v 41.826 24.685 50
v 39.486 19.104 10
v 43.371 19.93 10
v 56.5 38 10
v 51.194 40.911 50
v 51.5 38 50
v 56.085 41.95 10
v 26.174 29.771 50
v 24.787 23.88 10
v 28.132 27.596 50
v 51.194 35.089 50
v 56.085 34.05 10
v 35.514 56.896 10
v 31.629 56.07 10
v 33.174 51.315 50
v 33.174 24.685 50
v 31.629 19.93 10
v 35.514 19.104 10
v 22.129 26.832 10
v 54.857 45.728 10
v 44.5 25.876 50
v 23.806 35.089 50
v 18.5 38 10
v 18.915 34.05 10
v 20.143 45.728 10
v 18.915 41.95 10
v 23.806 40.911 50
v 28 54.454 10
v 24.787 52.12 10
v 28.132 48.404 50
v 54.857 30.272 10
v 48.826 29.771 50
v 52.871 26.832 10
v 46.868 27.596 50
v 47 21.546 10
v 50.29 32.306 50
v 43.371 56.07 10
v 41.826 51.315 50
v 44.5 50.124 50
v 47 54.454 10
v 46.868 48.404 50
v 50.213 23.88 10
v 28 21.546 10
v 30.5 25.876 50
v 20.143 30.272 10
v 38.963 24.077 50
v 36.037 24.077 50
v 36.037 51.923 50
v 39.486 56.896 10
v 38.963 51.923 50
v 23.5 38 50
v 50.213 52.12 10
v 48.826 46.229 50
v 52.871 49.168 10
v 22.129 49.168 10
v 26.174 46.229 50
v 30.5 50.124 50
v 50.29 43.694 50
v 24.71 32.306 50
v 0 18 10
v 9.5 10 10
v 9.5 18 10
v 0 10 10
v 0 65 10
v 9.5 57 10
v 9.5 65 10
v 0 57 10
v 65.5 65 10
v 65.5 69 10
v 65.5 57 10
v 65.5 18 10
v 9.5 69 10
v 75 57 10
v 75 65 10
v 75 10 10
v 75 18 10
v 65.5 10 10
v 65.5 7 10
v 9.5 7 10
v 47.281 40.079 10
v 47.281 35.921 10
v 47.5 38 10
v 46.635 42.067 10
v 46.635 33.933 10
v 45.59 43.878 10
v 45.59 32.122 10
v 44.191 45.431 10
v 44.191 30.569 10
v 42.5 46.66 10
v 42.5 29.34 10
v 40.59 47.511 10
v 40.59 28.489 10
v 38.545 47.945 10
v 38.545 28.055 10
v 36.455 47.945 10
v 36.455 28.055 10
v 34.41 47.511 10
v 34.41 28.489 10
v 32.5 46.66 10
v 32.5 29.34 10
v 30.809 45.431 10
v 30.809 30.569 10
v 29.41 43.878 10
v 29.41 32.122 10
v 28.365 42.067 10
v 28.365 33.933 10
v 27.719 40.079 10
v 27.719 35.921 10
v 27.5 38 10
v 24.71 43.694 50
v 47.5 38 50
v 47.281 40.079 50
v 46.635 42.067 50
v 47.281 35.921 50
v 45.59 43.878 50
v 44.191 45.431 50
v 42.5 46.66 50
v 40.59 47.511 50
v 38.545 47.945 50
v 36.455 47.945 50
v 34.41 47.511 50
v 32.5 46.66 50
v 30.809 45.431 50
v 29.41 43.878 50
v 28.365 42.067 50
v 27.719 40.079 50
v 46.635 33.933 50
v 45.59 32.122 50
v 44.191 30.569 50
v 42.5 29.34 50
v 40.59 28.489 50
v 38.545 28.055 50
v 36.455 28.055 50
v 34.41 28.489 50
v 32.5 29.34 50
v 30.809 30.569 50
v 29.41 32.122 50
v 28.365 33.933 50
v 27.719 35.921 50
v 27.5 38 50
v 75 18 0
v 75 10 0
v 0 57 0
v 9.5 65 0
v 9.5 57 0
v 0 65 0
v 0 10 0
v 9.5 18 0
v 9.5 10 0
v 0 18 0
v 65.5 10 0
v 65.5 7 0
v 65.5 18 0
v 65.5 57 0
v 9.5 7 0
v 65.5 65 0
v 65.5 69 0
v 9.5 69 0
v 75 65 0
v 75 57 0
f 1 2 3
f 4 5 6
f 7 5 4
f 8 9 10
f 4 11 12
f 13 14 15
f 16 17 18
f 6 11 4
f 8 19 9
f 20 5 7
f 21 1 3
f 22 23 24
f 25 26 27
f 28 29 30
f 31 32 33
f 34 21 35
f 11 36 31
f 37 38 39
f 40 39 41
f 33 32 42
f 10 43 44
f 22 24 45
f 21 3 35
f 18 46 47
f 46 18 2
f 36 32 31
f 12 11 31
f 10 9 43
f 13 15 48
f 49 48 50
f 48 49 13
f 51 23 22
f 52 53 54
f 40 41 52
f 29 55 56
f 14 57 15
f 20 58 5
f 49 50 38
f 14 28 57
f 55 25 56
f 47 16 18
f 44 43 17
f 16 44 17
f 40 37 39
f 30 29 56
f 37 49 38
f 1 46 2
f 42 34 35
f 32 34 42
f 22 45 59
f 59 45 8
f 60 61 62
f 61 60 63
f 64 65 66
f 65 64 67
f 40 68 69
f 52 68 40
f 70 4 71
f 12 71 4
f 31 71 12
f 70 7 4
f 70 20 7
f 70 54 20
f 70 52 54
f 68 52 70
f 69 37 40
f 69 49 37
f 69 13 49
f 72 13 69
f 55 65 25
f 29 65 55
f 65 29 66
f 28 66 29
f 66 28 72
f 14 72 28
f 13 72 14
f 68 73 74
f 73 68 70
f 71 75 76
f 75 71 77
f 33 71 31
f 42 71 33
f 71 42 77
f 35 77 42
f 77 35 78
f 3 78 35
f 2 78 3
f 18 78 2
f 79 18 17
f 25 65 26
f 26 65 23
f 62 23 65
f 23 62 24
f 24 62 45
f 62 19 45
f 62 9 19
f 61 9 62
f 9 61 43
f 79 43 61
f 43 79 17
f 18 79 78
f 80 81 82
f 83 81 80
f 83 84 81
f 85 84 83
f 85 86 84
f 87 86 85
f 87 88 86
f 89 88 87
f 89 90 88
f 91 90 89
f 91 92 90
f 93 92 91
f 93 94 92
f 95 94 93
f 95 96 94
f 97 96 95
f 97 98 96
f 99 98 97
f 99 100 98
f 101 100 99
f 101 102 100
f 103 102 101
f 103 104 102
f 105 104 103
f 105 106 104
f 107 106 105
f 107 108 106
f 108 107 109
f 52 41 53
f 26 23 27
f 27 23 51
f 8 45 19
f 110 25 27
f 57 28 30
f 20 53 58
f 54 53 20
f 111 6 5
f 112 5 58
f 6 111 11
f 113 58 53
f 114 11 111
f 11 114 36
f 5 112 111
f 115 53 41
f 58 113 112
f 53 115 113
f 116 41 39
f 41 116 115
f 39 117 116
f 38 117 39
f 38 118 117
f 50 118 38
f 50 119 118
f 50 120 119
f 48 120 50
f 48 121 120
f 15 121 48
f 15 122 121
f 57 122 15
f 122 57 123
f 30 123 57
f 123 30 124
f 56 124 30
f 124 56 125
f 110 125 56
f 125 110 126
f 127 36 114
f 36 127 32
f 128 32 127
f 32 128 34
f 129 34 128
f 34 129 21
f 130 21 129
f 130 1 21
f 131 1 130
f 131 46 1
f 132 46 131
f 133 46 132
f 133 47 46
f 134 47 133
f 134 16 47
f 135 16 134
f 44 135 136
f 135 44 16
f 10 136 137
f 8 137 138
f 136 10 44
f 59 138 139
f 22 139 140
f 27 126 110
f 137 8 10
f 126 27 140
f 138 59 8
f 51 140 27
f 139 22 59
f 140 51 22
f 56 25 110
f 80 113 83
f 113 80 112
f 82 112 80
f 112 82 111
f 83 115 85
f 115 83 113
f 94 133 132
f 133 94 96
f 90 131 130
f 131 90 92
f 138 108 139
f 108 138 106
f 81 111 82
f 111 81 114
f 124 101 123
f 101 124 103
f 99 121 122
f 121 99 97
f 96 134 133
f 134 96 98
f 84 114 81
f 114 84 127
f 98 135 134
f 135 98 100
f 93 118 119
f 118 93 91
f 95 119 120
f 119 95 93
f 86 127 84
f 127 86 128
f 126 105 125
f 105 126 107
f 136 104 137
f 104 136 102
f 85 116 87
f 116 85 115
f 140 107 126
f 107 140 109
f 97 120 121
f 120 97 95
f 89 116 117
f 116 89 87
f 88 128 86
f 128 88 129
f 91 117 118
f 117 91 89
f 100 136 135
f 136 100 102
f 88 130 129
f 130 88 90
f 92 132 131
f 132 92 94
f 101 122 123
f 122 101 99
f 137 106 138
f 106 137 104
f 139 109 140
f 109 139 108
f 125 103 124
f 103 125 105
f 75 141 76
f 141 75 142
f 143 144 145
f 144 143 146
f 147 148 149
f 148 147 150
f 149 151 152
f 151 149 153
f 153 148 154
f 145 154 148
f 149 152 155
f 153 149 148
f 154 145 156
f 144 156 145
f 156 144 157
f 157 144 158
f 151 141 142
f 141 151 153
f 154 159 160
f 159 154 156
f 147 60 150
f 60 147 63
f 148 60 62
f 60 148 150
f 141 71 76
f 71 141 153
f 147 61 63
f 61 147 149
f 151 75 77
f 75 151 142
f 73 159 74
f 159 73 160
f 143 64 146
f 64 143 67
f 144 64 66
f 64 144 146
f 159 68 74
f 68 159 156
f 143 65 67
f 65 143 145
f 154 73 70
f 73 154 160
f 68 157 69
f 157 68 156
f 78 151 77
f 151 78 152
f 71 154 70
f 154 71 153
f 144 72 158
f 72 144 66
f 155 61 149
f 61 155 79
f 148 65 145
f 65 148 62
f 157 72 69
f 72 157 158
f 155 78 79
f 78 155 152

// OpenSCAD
height = 40;
radius = 10;
rad_ext = radius+4;

union(){
	translate([0, 8+2, 0]) cube([75,8,10]);
	translate([0, 62-5, 0]) cube([75,8,10]);
	translate([(75-56)/2, 7, 0]) cube([56,62,10]);
	difference(){
		translate([75/2, 62/2+7, 10]) cylinder(height,rad_ext+5,rad_ext);
		translate([75/2, 62/2+7, 10]) cylinder(height+1,radius,radius);
	}	
}
